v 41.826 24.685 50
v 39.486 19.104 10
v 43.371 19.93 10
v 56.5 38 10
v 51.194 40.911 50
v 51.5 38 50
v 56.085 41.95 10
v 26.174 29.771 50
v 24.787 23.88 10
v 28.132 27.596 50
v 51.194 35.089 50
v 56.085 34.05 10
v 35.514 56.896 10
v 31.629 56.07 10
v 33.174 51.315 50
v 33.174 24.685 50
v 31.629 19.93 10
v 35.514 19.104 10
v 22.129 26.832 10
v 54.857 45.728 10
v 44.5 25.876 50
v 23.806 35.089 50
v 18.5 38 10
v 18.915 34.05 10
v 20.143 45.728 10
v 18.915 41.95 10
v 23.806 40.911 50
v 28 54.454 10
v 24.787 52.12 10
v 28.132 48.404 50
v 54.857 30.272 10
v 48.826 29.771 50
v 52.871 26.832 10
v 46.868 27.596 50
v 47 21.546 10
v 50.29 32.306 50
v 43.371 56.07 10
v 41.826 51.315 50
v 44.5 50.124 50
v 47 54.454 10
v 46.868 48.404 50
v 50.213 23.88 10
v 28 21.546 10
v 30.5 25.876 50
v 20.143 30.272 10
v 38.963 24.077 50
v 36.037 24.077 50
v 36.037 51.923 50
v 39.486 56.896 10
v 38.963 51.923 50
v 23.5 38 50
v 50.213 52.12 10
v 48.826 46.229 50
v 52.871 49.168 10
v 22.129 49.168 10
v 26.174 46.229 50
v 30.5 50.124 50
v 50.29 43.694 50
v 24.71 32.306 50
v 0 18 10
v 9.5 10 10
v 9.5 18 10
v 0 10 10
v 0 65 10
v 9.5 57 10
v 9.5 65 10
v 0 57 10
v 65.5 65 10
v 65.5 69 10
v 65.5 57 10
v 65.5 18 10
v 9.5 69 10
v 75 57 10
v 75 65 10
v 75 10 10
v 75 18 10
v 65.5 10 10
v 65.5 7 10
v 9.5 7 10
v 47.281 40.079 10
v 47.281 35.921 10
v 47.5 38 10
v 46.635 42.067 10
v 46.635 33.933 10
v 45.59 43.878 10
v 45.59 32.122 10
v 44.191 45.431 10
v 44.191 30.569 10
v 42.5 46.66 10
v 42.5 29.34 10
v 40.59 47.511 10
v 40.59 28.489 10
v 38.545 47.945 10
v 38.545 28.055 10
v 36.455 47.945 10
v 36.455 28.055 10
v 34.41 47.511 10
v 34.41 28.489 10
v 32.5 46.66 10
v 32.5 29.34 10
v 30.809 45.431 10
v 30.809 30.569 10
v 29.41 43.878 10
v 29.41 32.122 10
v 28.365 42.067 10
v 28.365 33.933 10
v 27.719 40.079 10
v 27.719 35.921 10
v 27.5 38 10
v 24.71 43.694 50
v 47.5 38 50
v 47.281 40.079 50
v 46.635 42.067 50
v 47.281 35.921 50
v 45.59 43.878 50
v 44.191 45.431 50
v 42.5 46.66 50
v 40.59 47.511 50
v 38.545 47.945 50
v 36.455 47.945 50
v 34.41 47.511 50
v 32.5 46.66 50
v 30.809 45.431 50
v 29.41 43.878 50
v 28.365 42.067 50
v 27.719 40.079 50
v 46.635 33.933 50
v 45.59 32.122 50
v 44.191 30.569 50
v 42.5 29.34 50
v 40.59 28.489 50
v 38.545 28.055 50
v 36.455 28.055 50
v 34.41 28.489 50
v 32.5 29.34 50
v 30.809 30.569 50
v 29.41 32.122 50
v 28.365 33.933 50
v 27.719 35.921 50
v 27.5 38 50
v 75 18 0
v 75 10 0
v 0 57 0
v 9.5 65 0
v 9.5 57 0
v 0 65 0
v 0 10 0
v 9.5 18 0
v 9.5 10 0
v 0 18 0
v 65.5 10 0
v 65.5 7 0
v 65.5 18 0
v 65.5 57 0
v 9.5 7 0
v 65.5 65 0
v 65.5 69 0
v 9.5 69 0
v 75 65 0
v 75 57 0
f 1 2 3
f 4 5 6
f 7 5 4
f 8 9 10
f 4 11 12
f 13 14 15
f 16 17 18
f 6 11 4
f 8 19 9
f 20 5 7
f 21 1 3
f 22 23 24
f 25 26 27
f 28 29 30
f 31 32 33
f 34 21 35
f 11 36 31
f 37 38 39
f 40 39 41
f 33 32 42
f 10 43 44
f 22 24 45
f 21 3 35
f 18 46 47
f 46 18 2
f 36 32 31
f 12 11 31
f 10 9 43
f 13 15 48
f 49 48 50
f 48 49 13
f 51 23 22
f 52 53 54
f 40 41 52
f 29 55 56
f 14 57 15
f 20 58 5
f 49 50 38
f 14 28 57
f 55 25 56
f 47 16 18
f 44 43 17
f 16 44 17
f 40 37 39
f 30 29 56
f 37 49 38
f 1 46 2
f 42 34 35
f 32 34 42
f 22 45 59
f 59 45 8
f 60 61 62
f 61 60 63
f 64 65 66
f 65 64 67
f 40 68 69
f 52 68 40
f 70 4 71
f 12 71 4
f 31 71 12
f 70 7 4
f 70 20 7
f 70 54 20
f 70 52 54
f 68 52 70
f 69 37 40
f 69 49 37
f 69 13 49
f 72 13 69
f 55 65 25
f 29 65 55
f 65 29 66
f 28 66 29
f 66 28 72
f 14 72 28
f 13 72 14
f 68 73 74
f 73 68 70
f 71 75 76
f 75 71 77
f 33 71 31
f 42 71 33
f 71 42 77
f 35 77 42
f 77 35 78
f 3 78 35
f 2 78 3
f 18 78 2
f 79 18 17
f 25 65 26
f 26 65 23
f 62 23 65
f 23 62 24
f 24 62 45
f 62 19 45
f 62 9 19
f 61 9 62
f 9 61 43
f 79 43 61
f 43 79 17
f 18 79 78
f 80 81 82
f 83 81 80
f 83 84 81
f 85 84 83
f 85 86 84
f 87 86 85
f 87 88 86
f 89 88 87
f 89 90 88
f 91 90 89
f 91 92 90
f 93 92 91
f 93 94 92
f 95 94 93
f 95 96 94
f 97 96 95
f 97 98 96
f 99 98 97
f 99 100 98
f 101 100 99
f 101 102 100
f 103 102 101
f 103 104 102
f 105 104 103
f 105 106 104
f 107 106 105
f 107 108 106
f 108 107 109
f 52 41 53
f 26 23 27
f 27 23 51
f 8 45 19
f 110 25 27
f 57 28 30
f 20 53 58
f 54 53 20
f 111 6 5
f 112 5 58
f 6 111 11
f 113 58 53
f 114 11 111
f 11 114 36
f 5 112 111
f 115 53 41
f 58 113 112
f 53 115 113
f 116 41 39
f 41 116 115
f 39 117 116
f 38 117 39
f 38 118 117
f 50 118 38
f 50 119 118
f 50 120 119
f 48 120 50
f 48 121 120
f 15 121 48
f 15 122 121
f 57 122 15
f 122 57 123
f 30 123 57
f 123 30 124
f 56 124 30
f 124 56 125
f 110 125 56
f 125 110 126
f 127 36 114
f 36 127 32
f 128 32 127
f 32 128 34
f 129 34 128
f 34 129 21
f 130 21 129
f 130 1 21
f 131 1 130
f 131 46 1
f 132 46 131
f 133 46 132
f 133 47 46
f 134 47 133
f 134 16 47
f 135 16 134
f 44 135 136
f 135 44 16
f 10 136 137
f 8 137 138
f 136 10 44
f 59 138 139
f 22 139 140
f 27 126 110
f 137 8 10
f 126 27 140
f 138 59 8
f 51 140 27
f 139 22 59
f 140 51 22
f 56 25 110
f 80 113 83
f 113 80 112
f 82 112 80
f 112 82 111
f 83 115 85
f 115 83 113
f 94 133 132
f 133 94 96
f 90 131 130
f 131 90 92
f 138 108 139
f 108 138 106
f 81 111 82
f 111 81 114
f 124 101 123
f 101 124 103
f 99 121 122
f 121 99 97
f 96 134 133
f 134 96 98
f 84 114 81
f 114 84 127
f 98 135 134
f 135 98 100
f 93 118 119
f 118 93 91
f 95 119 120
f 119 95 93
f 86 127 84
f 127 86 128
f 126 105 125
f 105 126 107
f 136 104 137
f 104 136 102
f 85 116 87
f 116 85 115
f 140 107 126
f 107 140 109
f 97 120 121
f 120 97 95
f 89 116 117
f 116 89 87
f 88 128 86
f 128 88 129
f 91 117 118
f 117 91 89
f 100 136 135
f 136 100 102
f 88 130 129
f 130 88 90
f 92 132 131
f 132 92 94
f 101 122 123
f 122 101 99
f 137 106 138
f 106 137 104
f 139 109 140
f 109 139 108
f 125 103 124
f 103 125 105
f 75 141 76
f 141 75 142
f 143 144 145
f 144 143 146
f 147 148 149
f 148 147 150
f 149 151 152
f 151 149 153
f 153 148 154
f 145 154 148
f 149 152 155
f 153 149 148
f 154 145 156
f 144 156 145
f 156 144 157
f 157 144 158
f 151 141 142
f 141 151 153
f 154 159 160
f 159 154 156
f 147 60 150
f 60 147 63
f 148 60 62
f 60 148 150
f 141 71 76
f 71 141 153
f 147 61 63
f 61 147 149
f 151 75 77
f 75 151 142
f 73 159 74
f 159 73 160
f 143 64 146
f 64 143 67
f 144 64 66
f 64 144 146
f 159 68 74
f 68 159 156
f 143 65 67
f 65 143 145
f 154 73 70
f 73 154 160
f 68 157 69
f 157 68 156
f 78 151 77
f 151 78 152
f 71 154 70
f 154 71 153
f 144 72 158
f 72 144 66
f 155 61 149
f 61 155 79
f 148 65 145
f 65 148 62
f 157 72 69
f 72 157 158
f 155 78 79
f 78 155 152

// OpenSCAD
height = 40;
radius = 10;
rad_ext = radius+4;

union(){
	translate([0, 8+2, 0]) cube([75,8,10]);
	translate([0, 62-5, 0]) cube([75,8,10]);
	translate([(75-56)/2, 7, 0]) cube([56,62,10]);
	difference(){
		translate([75/2, 62/2+7, 10]) cylinder(height,rad_ext+5,rad_ext);
		translate([75/2, 62/2+7, 10]) cylinder(height+1,radius,radius);
	}	
}
